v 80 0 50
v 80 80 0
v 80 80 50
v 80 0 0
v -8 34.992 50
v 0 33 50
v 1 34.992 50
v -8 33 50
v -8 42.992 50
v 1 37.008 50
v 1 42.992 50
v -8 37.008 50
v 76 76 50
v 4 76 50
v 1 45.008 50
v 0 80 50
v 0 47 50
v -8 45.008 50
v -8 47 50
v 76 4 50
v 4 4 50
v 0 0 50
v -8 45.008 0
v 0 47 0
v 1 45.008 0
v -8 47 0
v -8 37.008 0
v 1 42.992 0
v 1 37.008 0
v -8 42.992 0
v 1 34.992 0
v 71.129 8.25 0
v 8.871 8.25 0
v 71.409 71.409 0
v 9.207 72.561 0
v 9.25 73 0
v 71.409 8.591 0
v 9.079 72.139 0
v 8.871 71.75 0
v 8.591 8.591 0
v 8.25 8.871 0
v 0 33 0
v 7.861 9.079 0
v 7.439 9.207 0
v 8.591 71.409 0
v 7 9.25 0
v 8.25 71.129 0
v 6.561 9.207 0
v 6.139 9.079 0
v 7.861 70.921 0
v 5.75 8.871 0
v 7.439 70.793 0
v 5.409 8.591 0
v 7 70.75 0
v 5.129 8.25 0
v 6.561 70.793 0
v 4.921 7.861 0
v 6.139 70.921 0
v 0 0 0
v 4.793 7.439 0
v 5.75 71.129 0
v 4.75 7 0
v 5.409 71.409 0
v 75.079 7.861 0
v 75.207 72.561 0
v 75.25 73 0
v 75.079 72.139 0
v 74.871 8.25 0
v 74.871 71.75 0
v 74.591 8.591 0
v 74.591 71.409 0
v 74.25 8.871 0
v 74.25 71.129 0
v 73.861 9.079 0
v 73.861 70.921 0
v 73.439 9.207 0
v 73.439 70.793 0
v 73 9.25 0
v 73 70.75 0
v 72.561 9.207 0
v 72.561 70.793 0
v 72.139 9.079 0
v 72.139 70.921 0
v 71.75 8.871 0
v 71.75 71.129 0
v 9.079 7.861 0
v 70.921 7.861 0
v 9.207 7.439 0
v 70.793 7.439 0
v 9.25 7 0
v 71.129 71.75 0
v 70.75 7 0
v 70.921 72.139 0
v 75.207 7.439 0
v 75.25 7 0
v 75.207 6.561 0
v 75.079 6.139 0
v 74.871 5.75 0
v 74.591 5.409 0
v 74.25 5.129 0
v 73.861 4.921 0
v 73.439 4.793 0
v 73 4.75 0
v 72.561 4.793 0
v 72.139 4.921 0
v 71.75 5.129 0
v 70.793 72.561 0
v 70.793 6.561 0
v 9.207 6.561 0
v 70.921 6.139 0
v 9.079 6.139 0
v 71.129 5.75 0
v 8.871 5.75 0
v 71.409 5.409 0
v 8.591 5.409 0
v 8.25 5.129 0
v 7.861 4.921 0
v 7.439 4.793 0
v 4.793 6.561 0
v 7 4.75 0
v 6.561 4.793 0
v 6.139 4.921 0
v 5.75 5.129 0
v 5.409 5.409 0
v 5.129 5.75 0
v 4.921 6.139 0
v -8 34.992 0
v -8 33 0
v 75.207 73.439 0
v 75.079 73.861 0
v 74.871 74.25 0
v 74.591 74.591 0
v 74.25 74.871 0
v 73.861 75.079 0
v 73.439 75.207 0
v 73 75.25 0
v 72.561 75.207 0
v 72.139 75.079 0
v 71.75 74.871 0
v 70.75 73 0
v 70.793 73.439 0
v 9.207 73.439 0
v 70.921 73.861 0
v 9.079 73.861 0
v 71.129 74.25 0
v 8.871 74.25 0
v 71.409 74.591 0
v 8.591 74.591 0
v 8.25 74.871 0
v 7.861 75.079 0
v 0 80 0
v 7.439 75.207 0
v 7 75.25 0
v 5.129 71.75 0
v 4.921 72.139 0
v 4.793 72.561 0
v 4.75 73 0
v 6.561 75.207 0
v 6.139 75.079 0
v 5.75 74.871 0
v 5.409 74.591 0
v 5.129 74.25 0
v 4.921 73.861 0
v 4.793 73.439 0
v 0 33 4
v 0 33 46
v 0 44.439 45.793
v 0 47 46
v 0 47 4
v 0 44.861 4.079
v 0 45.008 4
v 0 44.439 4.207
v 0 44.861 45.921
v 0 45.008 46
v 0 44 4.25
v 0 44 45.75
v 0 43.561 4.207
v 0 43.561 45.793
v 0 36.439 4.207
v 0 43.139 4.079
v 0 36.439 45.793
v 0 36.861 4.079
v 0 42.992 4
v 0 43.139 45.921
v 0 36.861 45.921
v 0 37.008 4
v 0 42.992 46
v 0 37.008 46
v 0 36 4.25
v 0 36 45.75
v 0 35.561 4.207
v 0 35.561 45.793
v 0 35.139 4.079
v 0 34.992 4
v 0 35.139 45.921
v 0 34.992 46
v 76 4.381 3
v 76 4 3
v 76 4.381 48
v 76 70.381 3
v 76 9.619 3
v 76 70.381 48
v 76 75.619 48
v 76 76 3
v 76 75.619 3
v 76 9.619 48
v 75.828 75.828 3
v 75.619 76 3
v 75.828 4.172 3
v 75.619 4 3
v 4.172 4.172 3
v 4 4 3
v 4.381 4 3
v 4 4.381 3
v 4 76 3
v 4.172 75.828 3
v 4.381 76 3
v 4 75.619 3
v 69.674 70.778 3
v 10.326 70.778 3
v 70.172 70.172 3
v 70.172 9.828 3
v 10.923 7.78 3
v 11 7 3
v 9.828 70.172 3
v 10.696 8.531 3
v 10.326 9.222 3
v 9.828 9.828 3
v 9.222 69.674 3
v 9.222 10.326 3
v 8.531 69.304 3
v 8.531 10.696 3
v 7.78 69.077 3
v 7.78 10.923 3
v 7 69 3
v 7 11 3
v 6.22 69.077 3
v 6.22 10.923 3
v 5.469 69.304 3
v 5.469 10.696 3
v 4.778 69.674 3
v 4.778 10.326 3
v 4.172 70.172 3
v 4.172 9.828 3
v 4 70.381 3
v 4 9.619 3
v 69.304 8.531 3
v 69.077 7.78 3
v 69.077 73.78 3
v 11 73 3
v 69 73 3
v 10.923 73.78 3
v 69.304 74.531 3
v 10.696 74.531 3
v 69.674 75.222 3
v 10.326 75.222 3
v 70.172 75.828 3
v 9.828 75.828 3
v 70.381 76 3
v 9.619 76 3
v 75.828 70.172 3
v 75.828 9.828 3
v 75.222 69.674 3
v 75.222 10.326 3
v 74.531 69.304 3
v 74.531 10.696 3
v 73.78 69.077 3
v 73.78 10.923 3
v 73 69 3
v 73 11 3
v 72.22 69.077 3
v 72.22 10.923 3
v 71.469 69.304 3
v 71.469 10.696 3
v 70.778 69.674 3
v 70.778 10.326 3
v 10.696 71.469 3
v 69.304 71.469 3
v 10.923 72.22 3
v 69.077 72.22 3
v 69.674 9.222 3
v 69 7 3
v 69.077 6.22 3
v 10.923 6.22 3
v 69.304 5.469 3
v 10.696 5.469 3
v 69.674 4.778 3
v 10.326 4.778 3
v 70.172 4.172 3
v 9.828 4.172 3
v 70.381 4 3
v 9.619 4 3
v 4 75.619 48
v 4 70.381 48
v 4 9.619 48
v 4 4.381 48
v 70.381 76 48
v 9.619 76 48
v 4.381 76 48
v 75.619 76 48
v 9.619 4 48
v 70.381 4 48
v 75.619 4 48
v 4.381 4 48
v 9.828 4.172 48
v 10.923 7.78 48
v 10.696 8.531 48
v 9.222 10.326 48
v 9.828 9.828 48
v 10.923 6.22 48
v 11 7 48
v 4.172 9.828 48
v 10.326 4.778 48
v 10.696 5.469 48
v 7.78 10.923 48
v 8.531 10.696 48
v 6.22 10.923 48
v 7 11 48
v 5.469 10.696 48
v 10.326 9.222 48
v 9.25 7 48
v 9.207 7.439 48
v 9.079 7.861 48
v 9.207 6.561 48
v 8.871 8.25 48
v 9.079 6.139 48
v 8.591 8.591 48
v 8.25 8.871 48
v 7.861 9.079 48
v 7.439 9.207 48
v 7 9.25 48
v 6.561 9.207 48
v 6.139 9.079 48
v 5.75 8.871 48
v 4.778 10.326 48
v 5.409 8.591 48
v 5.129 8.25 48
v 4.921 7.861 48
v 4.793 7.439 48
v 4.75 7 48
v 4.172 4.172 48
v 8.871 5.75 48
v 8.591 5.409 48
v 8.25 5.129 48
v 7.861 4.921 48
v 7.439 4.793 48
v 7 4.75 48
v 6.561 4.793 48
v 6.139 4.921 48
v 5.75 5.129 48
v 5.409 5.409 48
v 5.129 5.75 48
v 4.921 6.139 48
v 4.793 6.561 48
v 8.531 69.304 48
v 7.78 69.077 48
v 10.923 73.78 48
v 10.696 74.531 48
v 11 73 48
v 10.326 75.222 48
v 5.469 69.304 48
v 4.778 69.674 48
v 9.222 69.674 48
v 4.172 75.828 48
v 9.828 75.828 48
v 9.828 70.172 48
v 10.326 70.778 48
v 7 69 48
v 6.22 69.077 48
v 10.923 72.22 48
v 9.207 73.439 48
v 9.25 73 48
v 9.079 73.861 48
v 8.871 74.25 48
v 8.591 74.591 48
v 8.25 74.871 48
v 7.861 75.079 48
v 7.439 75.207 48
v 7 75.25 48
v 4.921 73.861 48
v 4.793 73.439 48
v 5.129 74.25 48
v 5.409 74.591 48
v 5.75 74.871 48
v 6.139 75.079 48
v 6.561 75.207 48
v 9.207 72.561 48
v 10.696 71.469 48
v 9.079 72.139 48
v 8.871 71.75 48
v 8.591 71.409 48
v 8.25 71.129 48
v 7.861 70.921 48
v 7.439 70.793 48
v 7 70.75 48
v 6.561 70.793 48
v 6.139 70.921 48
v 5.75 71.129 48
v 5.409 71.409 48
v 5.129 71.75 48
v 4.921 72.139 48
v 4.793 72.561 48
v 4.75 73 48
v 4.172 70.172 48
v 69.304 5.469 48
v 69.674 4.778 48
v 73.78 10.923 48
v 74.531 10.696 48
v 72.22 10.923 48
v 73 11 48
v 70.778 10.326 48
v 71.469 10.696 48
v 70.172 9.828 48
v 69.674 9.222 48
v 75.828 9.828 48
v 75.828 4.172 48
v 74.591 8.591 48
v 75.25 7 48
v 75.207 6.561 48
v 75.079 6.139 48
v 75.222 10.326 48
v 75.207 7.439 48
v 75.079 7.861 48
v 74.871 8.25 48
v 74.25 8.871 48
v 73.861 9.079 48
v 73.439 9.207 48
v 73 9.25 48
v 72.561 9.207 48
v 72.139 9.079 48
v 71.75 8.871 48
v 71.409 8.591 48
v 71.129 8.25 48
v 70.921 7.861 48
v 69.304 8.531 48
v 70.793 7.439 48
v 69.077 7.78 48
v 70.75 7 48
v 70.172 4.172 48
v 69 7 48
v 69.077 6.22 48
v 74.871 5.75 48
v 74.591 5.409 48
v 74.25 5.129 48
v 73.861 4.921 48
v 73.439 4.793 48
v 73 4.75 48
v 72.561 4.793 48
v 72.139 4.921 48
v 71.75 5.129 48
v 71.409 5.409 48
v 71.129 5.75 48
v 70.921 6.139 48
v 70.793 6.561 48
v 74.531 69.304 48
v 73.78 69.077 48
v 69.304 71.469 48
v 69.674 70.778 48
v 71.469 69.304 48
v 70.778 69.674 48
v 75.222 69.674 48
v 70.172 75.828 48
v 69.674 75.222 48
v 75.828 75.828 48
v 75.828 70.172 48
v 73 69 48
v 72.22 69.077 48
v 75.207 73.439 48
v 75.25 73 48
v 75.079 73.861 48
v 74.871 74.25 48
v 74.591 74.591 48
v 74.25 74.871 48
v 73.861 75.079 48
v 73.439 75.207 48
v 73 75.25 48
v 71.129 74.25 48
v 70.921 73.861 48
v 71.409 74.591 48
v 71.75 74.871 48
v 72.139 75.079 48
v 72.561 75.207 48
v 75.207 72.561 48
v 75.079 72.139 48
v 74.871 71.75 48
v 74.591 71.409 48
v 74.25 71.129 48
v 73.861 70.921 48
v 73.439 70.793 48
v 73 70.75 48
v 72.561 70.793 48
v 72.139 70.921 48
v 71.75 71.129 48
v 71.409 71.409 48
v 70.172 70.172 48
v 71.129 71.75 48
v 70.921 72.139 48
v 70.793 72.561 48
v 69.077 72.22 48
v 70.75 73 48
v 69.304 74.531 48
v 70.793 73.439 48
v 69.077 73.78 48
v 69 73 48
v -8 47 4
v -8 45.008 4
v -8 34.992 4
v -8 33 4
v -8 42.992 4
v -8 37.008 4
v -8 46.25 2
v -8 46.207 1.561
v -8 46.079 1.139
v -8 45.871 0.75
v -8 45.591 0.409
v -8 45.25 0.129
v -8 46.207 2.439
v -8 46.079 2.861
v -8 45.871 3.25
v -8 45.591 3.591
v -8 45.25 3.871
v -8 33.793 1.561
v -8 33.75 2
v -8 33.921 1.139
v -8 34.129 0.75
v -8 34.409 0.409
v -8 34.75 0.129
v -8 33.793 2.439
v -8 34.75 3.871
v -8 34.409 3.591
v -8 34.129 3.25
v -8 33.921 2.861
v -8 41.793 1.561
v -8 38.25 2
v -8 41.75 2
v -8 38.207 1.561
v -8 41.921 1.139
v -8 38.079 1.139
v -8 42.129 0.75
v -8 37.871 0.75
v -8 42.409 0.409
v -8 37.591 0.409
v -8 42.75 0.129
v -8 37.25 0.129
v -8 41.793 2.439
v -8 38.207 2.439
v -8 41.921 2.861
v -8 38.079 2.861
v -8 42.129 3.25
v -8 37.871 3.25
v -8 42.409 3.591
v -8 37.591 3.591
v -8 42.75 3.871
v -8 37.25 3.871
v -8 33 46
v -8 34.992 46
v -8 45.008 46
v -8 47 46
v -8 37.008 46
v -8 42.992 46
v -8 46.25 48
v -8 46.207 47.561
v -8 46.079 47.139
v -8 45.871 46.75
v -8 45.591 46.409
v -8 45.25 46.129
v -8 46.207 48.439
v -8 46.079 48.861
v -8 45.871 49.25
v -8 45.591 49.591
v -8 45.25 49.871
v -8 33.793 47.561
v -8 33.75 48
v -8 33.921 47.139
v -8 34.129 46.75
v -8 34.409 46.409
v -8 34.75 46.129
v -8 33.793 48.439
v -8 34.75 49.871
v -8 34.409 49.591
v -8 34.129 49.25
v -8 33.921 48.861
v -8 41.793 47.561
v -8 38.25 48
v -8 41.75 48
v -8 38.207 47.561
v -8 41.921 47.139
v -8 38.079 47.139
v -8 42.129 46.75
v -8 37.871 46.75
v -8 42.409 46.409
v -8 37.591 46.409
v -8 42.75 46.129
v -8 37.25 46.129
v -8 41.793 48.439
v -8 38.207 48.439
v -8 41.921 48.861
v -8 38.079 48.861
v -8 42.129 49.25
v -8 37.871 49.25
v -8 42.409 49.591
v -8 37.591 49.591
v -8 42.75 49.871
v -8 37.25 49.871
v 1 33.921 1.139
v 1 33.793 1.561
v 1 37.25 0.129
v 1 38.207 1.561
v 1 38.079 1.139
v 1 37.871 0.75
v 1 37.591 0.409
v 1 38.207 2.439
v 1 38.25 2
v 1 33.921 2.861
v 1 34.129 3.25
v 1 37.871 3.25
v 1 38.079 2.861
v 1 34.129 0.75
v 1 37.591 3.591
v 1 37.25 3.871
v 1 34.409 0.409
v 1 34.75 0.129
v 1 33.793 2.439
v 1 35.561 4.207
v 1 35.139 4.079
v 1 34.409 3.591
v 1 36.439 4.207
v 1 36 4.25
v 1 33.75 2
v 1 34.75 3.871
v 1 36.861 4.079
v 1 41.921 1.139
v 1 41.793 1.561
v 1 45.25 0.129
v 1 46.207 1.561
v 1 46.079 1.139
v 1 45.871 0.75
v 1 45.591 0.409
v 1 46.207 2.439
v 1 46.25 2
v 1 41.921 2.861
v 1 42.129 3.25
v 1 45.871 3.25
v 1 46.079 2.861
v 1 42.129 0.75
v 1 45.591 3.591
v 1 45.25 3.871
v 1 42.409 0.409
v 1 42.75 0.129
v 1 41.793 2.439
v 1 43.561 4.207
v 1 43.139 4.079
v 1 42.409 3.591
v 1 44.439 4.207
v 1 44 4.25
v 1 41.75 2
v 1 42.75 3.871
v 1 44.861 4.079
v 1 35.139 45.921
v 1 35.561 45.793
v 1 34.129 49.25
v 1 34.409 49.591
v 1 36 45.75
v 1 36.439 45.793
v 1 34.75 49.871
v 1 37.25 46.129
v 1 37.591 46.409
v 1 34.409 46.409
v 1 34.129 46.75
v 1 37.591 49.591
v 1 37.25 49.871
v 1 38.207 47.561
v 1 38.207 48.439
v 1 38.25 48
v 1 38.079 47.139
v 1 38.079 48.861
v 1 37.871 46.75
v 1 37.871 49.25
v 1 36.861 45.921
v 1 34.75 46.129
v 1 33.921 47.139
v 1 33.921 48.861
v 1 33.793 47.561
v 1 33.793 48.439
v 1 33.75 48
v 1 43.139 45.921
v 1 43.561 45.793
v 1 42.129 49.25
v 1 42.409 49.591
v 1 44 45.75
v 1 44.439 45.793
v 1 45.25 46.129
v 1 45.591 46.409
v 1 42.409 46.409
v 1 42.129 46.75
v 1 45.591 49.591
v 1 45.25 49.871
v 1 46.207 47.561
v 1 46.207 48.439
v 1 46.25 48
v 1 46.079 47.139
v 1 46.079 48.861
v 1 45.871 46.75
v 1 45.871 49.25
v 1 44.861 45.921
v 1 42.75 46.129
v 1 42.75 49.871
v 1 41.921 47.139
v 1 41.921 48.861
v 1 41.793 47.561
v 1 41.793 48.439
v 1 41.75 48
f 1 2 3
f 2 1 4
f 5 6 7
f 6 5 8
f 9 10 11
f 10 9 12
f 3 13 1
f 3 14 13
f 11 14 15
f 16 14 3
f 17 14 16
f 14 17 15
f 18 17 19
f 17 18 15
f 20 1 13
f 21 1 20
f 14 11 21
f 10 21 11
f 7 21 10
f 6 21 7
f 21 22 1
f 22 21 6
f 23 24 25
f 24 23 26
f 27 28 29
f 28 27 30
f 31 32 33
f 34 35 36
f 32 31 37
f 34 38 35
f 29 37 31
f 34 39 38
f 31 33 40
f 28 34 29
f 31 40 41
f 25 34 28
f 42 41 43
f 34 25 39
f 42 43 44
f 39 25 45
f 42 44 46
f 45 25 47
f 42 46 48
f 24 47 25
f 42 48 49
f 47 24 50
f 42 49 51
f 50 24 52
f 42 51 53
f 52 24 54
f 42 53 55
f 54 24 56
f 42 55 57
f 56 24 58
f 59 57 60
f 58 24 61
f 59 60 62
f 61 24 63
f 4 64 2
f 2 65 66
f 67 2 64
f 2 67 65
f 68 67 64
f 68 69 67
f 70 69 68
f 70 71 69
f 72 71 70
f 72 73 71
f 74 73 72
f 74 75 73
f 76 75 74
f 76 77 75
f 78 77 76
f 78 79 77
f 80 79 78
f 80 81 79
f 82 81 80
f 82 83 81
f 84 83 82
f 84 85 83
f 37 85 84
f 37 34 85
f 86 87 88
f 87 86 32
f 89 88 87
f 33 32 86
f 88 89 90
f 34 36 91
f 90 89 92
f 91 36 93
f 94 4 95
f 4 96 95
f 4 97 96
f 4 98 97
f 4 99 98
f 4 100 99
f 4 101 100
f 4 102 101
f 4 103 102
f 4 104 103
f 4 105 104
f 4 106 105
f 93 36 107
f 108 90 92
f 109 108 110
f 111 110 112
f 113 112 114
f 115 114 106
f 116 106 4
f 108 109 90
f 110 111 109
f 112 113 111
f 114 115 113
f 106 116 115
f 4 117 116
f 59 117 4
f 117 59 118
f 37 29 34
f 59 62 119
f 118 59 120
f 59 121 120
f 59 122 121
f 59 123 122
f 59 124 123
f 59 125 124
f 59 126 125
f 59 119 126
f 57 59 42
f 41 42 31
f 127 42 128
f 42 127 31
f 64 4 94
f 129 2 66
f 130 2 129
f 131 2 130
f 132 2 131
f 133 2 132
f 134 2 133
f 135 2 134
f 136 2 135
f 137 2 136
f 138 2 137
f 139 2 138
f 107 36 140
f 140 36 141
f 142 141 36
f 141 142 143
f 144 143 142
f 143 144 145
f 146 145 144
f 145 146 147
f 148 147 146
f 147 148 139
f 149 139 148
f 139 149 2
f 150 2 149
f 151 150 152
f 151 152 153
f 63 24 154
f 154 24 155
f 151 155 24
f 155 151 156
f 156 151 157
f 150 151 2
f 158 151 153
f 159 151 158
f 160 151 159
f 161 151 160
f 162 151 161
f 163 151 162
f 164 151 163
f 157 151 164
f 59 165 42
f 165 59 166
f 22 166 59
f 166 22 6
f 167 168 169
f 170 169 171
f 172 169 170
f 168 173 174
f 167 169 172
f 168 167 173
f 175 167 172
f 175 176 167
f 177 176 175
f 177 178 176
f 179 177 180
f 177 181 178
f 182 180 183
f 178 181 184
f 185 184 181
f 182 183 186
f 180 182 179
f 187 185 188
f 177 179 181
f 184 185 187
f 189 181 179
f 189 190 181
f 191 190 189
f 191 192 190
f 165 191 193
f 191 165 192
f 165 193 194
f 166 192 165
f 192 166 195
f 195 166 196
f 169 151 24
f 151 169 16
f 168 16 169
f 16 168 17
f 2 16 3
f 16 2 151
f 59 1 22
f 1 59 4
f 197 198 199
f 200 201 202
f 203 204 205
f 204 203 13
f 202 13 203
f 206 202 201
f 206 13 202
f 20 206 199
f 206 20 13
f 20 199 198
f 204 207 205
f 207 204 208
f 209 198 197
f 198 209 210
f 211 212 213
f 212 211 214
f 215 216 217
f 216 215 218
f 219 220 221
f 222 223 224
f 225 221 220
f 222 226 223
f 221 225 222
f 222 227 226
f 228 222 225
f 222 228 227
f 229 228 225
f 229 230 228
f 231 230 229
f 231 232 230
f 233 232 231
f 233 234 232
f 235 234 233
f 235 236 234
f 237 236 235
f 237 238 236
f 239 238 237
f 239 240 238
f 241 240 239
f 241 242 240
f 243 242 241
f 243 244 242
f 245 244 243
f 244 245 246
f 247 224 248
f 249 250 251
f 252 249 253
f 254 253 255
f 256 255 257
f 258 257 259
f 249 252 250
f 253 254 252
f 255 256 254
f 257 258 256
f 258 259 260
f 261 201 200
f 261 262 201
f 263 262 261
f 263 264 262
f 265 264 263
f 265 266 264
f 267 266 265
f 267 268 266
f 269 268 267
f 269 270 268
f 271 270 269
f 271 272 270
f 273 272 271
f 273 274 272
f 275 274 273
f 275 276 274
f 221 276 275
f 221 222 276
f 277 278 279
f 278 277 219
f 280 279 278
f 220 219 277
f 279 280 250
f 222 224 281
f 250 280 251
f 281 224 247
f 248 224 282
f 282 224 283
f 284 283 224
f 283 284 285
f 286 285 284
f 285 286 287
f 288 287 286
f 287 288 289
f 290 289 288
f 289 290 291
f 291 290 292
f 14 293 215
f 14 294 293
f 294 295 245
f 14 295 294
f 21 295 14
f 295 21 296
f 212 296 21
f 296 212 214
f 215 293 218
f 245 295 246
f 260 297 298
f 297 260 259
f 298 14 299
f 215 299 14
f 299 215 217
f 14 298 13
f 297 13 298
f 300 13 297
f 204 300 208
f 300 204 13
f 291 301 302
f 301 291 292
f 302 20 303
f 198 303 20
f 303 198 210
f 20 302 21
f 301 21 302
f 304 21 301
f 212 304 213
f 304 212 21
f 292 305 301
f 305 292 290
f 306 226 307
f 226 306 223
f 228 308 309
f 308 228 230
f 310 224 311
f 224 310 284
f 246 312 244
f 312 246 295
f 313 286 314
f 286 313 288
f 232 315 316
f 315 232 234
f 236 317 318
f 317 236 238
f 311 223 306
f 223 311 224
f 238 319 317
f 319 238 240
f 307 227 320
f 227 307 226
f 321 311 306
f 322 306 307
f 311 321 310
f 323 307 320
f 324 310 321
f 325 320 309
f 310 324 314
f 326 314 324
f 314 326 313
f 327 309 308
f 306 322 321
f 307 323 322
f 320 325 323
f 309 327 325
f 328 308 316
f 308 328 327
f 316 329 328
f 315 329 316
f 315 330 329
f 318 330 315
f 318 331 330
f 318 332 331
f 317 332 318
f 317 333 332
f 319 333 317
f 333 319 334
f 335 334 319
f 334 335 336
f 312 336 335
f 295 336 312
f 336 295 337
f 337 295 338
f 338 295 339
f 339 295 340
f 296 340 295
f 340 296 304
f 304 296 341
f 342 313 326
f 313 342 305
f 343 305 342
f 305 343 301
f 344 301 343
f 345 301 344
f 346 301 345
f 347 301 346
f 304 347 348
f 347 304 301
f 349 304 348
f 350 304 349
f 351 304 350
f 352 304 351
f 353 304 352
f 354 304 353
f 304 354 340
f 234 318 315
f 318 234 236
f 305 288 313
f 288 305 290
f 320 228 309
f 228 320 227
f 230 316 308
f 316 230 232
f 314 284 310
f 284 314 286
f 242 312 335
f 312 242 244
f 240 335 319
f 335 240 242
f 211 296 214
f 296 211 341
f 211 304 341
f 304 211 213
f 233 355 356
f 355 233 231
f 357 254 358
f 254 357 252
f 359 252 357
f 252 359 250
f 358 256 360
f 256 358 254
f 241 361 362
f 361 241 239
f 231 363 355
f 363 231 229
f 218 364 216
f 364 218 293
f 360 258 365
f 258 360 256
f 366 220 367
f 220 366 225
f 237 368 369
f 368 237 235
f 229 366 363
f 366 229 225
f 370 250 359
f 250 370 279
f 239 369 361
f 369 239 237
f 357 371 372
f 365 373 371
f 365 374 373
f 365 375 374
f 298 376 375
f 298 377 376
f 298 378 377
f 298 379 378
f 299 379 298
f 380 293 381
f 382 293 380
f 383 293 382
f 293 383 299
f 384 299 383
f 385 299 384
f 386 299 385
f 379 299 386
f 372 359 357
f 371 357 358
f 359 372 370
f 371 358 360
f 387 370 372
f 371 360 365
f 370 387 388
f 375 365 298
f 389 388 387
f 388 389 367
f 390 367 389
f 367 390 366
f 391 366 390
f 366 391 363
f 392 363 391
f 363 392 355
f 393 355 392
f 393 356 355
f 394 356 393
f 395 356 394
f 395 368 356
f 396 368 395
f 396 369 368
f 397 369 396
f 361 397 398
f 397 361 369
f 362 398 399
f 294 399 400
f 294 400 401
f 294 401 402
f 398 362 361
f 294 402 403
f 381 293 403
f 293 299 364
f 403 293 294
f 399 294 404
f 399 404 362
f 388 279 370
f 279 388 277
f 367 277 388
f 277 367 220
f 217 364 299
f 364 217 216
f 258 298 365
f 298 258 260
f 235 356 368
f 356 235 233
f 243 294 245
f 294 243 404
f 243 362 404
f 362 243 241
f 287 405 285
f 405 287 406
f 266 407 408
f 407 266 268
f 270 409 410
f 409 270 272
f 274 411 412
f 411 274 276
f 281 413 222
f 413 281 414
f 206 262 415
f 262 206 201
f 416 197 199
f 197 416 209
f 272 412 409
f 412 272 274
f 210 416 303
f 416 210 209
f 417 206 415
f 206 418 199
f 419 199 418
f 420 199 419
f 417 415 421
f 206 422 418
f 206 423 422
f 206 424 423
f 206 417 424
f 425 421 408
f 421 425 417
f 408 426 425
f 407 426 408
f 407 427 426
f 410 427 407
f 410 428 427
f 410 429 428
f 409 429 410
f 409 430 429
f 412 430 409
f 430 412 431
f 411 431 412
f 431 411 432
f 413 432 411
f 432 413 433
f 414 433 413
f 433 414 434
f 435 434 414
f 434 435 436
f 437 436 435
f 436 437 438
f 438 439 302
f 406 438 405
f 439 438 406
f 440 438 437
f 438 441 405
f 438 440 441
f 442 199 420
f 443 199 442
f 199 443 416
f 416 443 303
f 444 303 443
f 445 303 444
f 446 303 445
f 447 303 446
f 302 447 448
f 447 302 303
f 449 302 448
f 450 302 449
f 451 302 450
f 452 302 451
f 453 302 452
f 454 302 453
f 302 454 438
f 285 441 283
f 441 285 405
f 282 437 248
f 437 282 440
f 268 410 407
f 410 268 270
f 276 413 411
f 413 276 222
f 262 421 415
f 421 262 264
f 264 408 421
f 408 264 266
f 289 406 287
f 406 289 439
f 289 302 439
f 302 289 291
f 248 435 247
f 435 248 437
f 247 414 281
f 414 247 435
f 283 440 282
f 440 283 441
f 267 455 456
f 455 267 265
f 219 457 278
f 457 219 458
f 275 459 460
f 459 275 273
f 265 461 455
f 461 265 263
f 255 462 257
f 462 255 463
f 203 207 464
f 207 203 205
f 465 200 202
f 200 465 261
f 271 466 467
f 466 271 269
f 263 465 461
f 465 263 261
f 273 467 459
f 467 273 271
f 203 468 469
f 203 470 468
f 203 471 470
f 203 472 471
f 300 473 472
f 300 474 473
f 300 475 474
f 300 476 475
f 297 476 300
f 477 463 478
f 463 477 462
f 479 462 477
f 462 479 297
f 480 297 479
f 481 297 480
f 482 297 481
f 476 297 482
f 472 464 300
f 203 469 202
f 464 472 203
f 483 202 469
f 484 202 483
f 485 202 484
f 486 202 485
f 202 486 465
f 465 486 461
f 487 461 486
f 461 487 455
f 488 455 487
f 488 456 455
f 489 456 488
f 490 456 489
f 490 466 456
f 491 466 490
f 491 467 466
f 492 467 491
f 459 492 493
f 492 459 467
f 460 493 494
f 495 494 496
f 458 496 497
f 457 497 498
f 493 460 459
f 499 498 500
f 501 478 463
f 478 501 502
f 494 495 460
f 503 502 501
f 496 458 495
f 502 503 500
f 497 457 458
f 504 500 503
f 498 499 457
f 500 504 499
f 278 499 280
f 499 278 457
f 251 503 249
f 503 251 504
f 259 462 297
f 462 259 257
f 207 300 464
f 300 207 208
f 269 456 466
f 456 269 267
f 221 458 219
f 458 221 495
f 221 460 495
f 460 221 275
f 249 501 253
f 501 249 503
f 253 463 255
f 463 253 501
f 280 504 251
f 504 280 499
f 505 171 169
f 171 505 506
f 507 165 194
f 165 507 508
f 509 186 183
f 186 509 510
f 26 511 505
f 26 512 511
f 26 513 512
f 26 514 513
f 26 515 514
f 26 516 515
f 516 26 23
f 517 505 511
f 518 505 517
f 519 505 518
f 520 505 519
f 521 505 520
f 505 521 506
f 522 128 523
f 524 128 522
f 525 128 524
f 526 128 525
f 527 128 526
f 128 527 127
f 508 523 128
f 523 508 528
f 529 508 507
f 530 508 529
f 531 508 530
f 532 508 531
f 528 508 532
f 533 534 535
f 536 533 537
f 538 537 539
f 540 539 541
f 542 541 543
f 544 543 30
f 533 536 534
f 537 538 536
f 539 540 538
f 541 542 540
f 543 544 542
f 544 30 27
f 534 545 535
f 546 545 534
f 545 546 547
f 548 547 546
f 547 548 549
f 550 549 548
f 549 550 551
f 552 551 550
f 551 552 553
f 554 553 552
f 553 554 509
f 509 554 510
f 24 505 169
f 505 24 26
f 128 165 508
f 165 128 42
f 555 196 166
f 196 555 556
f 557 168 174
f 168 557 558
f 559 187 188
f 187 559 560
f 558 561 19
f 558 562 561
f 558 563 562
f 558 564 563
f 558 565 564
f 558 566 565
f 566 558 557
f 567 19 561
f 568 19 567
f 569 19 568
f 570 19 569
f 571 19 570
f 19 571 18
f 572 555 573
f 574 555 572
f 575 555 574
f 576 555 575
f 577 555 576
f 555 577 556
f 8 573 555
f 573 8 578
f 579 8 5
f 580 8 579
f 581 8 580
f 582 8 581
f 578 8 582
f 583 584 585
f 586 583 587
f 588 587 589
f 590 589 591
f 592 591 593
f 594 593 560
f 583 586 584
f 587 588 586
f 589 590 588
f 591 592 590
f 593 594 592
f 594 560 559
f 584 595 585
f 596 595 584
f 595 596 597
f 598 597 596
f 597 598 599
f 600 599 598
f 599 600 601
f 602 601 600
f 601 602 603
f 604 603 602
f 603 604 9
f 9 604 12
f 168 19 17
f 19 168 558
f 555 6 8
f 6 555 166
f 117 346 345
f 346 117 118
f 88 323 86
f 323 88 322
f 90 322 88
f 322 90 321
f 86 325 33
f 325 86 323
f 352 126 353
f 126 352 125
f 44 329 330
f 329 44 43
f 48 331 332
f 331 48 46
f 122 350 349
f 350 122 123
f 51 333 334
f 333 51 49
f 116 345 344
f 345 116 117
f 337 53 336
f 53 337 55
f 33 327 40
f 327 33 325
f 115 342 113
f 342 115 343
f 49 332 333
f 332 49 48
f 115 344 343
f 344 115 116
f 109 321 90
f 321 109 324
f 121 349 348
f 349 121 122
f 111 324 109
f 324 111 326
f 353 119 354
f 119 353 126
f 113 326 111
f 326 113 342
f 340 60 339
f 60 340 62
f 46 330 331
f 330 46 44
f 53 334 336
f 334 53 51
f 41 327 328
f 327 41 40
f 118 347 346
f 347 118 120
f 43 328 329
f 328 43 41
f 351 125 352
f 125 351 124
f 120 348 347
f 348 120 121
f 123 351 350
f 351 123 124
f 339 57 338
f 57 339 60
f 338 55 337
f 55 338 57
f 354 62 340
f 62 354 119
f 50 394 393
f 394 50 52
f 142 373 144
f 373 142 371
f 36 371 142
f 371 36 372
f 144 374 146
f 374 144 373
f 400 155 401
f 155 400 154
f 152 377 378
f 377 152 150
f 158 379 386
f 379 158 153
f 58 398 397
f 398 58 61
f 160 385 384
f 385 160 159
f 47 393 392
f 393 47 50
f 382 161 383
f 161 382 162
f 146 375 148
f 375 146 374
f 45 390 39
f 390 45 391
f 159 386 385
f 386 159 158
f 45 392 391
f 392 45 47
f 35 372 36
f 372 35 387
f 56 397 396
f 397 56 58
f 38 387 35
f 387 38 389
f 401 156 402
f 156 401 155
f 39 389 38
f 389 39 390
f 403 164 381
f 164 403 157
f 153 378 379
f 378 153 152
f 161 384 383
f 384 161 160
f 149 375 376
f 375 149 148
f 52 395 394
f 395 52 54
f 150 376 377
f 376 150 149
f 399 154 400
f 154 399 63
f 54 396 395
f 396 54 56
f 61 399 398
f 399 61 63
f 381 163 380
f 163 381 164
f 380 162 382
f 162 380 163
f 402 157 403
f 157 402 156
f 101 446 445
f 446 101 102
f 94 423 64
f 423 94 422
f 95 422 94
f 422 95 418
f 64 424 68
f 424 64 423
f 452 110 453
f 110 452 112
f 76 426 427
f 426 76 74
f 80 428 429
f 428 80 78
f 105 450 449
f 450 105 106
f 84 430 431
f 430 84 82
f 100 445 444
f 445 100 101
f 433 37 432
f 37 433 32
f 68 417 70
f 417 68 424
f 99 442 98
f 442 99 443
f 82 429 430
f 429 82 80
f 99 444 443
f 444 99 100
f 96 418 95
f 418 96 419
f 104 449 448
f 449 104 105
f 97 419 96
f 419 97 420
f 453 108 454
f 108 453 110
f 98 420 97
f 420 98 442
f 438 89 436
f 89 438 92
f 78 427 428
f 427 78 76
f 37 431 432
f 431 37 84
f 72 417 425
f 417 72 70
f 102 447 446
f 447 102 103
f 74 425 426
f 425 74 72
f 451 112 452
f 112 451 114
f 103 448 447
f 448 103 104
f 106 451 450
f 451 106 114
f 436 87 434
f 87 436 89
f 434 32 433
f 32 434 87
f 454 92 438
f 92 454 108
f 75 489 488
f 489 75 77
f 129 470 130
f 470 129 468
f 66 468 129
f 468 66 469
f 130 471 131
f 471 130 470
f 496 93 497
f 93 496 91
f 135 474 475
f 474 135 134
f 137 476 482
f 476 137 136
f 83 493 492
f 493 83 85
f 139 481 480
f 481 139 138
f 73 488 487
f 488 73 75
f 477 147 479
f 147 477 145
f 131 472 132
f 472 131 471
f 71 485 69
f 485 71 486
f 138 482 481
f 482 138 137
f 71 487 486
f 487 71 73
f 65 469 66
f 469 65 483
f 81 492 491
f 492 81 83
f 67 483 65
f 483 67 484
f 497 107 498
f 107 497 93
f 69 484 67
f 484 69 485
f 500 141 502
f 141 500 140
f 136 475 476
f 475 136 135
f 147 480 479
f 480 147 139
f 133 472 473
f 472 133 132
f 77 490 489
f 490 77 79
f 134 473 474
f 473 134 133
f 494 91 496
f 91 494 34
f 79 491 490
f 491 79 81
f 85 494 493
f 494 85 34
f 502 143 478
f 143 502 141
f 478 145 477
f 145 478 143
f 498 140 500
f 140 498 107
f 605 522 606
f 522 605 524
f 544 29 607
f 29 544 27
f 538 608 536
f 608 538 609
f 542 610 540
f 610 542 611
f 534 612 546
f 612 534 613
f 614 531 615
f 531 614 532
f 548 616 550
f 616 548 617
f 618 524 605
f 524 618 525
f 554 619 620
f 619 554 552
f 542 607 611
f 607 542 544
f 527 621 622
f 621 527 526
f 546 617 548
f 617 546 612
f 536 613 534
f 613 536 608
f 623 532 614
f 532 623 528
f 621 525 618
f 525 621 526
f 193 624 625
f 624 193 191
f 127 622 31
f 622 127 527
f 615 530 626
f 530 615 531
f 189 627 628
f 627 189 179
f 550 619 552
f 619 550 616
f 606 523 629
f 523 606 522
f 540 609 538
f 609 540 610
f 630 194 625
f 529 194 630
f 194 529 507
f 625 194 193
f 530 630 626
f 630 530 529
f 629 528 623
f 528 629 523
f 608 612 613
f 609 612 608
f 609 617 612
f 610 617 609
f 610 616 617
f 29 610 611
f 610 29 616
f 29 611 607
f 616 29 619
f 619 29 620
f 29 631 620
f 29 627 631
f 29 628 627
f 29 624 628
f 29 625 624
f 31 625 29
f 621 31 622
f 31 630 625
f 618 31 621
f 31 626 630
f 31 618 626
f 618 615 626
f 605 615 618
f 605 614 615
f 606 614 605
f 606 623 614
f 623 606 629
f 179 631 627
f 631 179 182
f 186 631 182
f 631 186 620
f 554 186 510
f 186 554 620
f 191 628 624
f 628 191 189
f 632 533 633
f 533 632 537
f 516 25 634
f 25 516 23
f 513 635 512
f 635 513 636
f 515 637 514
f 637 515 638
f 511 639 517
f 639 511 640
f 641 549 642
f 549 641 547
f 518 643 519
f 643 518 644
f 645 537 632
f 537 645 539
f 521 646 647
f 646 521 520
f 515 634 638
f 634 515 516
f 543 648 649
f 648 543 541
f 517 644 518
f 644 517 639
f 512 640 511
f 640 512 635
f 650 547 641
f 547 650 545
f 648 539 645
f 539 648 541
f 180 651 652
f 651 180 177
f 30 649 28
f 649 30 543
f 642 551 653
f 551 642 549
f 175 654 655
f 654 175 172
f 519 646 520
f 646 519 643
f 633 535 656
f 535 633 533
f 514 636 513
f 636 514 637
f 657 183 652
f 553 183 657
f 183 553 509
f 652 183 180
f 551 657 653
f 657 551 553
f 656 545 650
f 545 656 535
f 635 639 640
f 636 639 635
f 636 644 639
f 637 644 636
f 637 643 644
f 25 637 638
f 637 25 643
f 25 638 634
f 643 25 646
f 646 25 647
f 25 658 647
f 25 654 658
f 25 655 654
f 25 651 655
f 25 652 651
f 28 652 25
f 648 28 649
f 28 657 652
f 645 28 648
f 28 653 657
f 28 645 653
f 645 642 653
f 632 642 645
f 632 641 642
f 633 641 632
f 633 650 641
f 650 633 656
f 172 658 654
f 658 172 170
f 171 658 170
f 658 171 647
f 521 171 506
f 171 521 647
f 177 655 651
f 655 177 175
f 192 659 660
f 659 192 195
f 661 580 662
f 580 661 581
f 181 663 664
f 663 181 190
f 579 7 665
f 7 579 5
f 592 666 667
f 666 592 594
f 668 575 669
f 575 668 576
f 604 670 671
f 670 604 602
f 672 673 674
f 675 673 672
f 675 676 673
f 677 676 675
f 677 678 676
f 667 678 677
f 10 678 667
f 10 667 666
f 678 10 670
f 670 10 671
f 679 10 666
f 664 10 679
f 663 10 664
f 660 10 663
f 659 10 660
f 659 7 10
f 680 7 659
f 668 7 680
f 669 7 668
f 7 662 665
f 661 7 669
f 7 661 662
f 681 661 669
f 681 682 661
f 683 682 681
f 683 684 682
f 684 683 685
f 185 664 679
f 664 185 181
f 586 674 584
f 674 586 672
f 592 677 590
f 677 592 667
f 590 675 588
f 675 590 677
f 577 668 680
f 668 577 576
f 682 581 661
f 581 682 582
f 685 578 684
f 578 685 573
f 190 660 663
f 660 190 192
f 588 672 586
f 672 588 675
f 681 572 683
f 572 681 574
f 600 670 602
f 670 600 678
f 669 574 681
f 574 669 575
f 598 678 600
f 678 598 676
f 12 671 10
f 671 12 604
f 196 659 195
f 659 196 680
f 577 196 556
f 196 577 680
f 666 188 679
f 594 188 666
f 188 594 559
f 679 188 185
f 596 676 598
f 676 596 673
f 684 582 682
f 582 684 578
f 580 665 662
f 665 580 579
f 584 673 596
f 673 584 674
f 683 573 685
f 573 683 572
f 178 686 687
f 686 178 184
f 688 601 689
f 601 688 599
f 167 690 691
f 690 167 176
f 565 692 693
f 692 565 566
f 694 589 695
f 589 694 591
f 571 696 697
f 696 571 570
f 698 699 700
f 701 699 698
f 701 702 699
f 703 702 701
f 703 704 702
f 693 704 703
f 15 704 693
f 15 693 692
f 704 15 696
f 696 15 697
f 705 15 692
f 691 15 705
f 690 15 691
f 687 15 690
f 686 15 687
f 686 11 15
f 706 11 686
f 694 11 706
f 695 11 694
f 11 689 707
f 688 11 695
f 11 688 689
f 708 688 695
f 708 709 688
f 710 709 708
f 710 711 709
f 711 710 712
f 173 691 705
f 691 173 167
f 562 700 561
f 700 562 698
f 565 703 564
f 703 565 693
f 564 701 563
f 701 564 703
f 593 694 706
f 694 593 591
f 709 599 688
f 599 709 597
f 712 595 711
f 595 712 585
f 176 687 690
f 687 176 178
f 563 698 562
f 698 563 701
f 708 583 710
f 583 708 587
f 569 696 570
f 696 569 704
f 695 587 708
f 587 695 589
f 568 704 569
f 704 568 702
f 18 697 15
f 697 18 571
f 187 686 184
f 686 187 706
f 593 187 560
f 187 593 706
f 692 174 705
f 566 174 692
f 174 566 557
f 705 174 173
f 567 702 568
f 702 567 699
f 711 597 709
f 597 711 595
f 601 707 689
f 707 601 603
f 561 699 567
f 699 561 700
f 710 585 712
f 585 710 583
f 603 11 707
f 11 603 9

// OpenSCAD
$fn = 32;

// ----------------------------------------------------------------------
// Enclosure body: 80 x 80 x 50 mm, wall 4 mm
// ----------------------------------------------------------------------

// --- parameters (mm) ---
length = 80;              // outside length, X
width = 80;               // outside width, Y
height = 50;              // outside height, Z
wall = 4;                 // side wall thickness
floor_t = 3;              // floor thickness
boss_d = 8;               // corner boss diameter
boss_h = 45;              // corner boss height above the floor
boss_hole_d = 4.5;        // lid screw clearance in the boss
boss_lip = 7;             // boss centre inset from the corner
ear_w = 14;               // mounting ear width
ear_t = 4;                // mounting ear thickness
ear_ext = 8;              // mounting ear reach
ear_hole_d = 4.5;         // mounting ear drills

module shell() {
  difference() {
    cube([length, width, height]);
    /* hollow, open at the top */
    translate([wall, wall, floor_t])
      cube([length - 2 * wall, width - 2 * wall, height]);
  }
}

module bosses() {
  /* corner bosses, sunk 1 mm into the floor */
  for (sx = [0, 1]) for (sy = [0, 1])
    translate([sx * (length - 2 * boss_lip) + boss_lip, sy * (width - 2 * boss_lip) + boss_lip, floor_t - 1])
      cylinder(h = boss_h + 1, d = boss_d);
}

module ears() {
  /* mounting ears on the short walls, sunk into the wall */
  for (sz = [0, 1])
    translate([-ear_ext, width / 2 - ear_w / 2, sz * (height - ear_t)])
      cube([ear_ext + 2.5, ear_w, ear_t]);
}

difference() {
  union() {
    shell();
    bosses();
    ears();
  }
  /* boss screw holes */
  for (sx = [0, 1]) for (sy = [0, 1])
    translate([sx * (length - 2 * boss_lip) + boss_lip, sy * (width - 2 * boss_lip) + boss_lip, -1]) cylinder(h = floor_t + boss_h + 2, d = boss_hole_d);
  for (sz = [0, 1]) for (sx = [0, 1]) translate([-ear_ext - 1, width / 2 + (2 * sx - 1) * (ear_w / 2 - 3), sz * (height - ear_t) + ear_t / 2]) rotate([0, 90, 0]) cylinder(h = ear_ext + 2, d = ear_hole_d);
}
